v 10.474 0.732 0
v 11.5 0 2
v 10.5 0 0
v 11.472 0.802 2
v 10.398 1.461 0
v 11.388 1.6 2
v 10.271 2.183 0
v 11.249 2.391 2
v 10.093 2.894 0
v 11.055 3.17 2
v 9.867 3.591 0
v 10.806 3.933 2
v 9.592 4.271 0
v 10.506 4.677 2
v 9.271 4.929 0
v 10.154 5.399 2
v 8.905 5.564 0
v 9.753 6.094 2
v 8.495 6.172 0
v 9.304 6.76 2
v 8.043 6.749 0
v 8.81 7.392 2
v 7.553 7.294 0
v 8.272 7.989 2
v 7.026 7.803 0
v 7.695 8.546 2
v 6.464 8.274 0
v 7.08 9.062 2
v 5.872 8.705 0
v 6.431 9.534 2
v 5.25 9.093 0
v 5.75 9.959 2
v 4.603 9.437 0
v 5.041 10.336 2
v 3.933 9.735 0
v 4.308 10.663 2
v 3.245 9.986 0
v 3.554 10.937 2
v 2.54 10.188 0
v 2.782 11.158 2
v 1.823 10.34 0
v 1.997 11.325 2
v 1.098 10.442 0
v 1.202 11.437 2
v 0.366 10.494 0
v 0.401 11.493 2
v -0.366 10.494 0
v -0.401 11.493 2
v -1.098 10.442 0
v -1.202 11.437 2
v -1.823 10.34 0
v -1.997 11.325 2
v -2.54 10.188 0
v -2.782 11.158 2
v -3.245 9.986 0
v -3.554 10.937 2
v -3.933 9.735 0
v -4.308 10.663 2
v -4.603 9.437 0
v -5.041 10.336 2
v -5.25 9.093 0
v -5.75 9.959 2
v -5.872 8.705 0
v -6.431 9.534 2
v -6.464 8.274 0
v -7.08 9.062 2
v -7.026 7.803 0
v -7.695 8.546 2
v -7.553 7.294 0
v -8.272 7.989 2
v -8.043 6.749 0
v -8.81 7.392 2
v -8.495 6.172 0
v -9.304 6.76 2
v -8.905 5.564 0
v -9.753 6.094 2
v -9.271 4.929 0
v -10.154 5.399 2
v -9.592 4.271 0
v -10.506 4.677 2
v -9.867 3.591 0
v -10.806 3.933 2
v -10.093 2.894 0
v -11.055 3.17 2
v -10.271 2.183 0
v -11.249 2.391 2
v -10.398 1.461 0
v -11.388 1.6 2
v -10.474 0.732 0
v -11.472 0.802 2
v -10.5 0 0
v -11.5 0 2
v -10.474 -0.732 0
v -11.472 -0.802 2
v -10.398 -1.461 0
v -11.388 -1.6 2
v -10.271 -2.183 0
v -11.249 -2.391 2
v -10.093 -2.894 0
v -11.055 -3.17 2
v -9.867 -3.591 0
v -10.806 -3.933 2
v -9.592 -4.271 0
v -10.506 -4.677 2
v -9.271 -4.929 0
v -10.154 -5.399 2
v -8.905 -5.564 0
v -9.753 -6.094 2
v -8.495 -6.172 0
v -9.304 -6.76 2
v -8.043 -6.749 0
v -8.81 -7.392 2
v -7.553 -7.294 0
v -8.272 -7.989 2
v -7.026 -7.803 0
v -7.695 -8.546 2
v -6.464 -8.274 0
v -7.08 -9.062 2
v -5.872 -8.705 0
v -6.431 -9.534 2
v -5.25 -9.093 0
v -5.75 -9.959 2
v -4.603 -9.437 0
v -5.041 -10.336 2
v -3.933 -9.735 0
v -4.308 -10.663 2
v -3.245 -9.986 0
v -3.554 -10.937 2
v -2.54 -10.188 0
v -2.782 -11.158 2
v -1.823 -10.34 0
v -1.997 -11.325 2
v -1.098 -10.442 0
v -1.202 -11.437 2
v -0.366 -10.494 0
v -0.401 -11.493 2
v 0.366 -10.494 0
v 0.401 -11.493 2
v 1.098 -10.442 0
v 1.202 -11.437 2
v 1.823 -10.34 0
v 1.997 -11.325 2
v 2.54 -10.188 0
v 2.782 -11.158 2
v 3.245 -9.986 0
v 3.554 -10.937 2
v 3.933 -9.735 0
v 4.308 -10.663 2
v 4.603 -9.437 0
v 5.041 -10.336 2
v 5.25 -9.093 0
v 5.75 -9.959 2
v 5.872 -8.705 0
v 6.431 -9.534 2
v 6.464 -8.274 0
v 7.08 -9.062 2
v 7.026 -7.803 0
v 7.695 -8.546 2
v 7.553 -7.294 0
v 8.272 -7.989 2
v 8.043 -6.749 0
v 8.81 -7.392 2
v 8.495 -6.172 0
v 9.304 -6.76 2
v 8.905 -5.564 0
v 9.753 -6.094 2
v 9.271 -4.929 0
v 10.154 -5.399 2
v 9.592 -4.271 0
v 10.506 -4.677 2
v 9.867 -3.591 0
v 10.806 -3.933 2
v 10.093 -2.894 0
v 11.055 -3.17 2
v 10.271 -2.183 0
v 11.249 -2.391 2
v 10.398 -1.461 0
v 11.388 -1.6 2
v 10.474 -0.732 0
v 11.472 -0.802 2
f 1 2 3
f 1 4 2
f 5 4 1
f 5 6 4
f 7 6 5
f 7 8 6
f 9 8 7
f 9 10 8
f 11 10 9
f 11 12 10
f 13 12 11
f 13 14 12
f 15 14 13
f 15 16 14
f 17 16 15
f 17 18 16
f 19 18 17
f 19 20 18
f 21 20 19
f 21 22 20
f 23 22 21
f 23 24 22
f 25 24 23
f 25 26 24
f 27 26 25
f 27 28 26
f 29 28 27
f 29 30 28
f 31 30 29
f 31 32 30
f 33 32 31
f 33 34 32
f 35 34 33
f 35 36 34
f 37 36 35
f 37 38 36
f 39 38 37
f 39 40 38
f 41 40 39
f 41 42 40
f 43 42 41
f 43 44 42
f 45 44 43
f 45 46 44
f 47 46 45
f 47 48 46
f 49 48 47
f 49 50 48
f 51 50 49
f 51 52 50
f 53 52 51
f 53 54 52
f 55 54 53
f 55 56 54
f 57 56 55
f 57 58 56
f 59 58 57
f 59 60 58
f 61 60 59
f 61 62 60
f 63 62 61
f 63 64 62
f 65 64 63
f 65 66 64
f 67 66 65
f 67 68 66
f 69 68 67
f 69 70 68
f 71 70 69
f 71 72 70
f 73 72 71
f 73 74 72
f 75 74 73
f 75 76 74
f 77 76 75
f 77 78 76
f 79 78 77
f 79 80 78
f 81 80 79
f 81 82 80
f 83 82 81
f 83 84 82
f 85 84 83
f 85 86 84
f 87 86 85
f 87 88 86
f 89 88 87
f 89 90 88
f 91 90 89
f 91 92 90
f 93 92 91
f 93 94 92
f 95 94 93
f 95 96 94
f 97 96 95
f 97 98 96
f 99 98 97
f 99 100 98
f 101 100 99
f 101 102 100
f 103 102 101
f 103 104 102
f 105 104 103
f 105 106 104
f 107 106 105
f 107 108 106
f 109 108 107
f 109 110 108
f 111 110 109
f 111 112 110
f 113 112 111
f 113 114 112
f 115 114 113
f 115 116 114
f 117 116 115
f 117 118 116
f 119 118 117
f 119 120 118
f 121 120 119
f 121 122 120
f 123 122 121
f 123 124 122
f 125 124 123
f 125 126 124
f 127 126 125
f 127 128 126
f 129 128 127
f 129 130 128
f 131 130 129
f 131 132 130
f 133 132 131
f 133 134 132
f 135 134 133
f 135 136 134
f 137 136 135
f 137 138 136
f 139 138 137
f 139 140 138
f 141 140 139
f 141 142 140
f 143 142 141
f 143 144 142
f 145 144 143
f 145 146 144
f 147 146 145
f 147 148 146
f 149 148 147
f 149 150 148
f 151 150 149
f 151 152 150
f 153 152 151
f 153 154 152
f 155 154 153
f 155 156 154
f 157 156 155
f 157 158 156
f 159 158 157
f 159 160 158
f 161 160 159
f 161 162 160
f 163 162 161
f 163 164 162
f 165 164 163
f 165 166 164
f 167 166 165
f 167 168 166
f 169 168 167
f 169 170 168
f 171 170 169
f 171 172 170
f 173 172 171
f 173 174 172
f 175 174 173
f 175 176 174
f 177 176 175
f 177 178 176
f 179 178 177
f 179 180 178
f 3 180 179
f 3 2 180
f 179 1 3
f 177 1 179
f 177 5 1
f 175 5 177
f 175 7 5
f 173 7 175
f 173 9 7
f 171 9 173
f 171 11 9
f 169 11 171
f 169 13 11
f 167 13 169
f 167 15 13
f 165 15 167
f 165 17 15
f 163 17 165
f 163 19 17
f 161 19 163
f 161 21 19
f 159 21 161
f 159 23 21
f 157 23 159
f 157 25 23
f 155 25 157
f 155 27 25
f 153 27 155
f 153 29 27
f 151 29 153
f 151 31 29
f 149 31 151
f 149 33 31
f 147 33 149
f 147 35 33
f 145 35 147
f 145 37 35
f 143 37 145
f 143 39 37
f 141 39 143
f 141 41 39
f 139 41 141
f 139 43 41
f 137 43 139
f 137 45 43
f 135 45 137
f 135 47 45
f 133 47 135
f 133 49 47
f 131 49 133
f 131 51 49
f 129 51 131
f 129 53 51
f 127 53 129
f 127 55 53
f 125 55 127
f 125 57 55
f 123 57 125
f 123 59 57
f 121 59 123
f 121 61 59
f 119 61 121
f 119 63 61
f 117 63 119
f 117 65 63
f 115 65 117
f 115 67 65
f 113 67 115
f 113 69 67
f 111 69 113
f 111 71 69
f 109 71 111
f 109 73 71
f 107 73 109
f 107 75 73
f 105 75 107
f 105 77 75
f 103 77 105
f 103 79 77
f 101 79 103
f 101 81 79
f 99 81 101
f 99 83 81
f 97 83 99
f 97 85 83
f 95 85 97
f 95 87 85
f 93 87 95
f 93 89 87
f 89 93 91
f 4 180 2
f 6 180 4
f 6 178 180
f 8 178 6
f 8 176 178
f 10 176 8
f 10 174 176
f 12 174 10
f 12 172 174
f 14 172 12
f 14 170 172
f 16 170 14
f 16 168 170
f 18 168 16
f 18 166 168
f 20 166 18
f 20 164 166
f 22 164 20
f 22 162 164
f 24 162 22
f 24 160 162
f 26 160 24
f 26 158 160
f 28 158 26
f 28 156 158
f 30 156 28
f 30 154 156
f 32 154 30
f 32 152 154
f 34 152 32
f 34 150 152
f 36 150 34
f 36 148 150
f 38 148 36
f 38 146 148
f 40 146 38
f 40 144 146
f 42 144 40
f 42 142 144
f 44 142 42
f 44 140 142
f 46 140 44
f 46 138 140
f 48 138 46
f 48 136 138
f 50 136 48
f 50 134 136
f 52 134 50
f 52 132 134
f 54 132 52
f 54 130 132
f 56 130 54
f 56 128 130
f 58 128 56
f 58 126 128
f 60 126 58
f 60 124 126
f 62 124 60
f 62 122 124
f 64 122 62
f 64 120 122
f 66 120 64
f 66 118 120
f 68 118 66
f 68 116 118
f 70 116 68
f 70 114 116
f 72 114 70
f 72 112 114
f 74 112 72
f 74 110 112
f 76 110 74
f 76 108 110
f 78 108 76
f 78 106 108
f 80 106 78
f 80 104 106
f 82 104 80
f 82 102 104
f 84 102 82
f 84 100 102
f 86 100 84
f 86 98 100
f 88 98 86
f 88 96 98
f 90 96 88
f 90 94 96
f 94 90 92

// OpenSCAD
$fa=4; // default minimum facet angle is now 4
$fs=0.05; // default minimum facet size is now 0.05 mm

cylinder(r1 = 10.5, r2=11.5, h=2);
